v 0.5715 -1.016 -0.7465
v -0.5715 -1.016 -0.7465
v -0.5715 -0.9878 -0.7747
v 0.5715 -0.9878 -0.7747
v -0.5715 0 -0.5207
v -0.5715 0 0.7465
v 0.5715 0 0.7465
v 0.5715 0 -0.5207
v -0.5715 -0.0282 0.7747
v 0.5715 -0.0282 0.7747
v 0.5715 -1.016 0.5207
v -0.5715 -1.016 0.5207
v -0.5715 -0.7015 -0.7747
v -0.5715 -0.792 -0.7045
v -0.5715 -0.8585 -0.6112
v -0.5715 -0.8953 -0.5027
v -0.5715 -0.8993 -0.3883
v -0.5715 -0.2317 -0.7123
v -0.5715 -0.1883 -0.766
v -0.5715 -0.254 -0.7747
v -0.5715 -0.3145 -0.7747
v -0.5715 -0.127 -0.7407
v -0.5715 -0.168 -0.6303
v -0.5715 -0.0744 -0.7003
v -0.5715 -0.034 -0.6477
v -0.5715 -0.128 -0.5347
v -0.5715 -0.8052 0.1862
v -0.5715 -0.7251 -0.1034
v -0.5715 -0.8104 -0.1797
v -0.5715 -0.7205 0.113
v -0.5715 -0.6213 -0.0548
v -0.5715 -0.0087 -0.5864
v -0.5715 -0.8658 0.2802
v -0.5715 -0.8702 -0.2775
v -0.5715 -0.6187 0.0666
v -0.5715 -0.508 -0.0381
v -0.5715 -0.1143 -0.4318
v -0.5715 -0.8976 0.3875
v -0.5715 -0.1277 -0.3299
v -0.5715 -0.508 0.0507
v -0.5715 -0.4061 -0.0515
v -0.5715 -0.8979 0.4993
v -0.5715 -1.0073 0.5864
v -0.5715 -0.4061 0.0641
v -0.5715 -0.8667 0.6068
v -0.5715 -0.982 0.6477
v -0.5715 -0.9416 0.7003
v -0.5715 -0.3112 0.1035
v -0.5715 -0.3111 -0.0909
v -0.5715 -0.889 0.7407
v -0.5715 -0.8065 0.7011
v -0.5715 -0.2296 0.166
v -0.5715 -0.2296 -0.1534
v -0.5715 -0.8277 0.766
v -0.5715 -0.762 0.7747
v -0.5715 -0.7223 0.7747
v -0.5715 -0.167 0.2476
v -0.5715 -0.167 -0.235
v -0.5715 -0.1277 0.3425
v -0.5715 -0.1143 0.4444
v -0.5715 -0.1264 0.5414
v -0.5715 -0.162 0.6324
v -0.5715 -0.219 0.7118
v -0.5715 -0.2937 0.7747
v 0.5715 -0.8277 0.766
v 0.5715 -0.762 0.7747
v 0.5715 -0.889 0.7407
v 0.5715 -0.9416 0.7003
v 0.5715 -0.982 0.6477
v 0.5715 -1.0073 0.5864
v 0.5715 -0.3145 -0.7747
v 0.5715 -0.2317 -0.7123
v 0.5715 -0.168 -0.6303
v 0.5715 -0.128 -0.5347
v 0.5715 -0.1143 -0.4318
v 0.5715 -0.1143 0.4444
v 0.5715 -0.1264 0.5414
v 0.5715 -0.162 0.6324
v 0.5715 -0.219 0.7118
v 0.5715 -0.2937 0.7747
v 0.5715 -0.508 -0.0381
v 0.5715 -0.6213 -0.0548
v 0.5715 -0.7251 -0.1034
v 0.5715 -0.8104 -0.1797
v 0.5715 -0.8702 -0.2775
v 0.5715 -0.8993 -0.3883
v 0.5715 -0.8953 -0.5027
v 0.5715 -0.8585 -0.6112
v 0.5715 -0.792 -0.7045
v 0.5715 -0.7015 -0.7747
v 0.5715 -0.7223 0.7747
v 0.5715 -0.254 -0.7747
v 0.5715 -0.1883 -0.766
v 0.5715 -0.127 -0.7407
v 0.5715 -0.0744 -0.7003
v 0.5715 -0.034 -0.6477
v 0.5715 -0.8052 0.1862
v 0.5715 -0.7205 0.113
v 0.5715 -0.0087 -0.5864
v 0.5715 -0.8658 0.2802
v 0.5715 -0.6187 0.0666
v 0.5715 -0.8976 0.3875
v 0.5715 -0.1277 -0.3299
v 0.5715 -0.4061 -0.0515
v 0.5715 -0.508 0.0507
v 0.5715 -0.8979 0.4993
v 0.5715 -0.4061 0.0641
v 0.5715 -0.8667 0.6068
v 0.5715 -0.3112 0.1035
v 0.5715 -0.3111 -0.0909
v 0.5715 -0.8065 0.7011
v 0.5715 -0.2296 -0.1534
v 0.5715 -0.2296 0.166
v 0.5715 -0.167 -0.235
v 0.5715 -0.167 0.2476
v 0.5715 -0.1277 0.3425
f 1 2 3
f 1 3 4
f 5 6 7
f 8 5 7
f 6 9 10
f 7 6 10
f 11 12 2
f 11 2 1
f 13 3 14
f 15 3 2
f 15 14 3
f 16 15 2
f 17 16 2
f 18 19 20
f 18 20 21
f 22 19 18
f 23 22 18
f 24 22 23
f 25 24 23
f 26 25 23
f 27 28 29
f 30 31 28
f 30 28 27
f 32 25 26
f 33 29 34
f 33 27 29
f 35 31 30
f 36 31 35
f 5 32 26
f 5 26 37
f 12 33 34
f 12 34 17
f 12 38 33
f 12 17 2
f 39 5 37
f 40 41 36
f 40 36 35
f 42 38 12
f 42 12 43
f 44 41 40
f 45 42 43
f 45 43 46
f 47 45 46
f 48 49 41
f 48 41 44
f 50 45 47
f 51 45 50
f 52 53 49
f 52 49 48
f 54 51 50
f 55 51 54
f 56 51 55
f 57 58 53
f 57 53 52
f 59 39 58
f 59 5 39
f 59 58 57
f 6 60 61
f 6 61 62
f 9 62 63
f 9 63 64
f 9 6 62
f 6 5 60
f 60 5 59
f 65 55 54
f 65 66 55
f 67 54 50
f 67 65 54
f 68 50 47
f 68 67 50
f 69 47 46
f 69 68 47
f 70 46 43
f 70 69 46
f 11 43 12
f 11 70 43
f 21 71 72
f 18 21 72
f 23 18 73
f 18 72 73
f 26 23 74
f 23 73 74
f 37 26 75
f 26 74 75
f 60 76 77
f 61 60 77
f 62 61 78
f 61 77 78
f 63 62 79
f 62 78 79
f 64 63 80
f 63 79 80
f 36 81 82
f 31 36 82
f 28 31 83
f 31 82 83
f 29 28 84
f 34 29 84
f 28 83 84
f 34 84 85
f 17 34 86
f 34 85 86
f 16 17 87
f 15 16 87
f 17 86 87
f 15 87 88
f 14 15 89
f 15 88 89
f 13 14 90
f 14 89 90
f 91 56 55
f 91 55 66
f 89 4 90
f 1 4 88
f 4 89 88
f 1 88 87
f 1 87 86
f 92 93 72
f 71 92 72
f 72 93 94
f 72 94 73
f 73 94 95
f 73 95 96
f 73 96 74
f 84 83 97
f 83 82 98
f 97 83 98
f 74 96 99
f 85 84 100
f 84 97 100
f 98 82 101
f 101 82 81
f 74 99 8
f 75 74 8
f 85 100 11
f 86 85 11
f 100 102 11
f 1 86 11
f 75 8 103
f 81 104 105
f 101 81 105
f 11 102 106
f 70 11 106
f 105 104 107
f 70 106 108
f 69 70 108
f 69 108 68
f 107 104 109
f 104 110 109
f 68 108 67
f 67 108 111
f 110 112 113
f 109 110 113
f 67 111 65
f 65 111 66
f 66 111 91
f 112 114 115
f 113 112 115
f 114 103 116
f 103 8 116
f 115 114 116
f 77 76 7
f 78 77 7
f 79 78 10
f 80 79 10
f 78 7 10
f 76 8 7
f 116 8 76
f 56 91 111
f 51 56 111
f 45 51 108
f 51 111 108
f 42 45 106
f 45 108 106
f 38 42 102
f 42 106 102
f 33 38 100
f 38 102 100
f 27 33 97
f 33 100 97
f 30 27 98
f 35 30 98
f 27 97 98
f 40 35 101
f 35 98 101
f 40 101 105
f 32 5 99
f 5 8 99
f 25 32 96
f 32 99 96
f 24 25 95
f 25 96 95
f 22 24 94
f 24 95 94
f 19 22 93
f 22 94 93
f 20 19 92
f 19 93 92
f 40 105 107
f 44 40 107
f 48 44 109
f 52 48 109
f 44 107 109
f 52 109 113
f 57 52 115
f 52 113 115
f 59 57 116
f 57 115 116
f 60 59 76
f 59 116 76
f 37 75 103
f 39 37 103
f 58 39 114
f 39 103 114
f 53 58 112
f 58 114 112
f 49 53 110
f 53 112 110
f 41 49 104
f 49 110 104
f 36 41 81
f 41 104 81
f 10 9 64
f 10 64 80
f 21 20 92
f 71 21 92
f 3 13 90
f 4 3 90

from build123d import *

# Parameters (mm, degrees)
F0_W     = 1.143
F0_H     = 1.5494
F1_DEPTH = 1.016
F3_DEPTH = 25.4
F4_R     = 0.254
F5_R     = 0.254
F6_SIZE  = 0.028194


with BuildPart() as f1:
    # F0 (on Front) → F1 (new body)
    with BuildSketch(Plane.XZ):
        Rectangle(F0_W, F0_H)
    extrude(amount=F1_DEPTH)

    # F2 (on face) → F3 (cut)
    with BuildSketch(Plane.YZ.offset(0.5715)):
        with BuildLine():
            Line((-0.508, 0.0507245232), (-0.508, 0.7747))
            Line((-0.508, 0.7747), (-0.7222843892, 0.7747))
            ThreePointArc((-0.7222843892, 0.7747), (-0.8855110232, 0.3326877012), (-0.508, 0.0507245232))
        make_face()
        with BuildLine():
            Line((-0.508, -0.7747), (-0.508, -0.0381136742))
            ThreePointArc((-0.508, -0.0381136742), (-0.88878474, -0.3318003163), (-0.7014648743, -0.7747))
            Line((-0.7014648743, -0.7747), (-0.508, -0.7747))
        make_face()
        with BuildLine():
            ThreePointArc((-0.1143, -0.4318136742), (-0.2296120602, -0.1534257344), (-0.508, -0.0381136742))
            Line((-0.508, -0.0381136742), (-0.508, -0.7747))
            Line((-0.508, -0.7747), (-0.3145351257, -0.7747))
            ThreePointArc((-0.3145351257, -0.7747), (-0.1680244046, -0.6303490224), (-0.1143, -0.4318136742))
        make_face()
        with BuildLine():
            Line((-0.2937156108, 0.7747), (-0.508, 0.7747))
            Line((-0.508, 0.7747), (-0.508, 0.0507245232))
            ThreePointArc((-0.508, 0.0507245232), (-0.2296120602, 0.1660365835), (-0.1143, 0.4444245232))
            ThreePointArc((-0.1143, 0.4444245232), (-0.162049531, 0.6323552631), (-0.2937156108, 0.7747))
        make_face()
    extrude(amount=-F3_DEPTH, mode=Mode.SUBTRACT)

    # F4
    f4_edges = [f1.edges().sort_by_distance(p)[0] for p in [
        (0, -1.016, 0.7747),
    ]]
    fillet(f4_edges, radius=F4_R)

    # F5
    f5_edges = [f1.edges().sort_by_distance(p)[0] for p in [
        (0, 0, -0.7747),
    ]]
    fillet(f5_edges, radius=F5_R)

    # F6
    f6_edges = [f1.edges().sort_by_distance(p)[0] for p in [
        (0, 0, 0.7747),
        (0, -1.016, -0.7747),
    ]]
    chamfer(f6_edges, length=F6_SIZE)


solid = f1.part
